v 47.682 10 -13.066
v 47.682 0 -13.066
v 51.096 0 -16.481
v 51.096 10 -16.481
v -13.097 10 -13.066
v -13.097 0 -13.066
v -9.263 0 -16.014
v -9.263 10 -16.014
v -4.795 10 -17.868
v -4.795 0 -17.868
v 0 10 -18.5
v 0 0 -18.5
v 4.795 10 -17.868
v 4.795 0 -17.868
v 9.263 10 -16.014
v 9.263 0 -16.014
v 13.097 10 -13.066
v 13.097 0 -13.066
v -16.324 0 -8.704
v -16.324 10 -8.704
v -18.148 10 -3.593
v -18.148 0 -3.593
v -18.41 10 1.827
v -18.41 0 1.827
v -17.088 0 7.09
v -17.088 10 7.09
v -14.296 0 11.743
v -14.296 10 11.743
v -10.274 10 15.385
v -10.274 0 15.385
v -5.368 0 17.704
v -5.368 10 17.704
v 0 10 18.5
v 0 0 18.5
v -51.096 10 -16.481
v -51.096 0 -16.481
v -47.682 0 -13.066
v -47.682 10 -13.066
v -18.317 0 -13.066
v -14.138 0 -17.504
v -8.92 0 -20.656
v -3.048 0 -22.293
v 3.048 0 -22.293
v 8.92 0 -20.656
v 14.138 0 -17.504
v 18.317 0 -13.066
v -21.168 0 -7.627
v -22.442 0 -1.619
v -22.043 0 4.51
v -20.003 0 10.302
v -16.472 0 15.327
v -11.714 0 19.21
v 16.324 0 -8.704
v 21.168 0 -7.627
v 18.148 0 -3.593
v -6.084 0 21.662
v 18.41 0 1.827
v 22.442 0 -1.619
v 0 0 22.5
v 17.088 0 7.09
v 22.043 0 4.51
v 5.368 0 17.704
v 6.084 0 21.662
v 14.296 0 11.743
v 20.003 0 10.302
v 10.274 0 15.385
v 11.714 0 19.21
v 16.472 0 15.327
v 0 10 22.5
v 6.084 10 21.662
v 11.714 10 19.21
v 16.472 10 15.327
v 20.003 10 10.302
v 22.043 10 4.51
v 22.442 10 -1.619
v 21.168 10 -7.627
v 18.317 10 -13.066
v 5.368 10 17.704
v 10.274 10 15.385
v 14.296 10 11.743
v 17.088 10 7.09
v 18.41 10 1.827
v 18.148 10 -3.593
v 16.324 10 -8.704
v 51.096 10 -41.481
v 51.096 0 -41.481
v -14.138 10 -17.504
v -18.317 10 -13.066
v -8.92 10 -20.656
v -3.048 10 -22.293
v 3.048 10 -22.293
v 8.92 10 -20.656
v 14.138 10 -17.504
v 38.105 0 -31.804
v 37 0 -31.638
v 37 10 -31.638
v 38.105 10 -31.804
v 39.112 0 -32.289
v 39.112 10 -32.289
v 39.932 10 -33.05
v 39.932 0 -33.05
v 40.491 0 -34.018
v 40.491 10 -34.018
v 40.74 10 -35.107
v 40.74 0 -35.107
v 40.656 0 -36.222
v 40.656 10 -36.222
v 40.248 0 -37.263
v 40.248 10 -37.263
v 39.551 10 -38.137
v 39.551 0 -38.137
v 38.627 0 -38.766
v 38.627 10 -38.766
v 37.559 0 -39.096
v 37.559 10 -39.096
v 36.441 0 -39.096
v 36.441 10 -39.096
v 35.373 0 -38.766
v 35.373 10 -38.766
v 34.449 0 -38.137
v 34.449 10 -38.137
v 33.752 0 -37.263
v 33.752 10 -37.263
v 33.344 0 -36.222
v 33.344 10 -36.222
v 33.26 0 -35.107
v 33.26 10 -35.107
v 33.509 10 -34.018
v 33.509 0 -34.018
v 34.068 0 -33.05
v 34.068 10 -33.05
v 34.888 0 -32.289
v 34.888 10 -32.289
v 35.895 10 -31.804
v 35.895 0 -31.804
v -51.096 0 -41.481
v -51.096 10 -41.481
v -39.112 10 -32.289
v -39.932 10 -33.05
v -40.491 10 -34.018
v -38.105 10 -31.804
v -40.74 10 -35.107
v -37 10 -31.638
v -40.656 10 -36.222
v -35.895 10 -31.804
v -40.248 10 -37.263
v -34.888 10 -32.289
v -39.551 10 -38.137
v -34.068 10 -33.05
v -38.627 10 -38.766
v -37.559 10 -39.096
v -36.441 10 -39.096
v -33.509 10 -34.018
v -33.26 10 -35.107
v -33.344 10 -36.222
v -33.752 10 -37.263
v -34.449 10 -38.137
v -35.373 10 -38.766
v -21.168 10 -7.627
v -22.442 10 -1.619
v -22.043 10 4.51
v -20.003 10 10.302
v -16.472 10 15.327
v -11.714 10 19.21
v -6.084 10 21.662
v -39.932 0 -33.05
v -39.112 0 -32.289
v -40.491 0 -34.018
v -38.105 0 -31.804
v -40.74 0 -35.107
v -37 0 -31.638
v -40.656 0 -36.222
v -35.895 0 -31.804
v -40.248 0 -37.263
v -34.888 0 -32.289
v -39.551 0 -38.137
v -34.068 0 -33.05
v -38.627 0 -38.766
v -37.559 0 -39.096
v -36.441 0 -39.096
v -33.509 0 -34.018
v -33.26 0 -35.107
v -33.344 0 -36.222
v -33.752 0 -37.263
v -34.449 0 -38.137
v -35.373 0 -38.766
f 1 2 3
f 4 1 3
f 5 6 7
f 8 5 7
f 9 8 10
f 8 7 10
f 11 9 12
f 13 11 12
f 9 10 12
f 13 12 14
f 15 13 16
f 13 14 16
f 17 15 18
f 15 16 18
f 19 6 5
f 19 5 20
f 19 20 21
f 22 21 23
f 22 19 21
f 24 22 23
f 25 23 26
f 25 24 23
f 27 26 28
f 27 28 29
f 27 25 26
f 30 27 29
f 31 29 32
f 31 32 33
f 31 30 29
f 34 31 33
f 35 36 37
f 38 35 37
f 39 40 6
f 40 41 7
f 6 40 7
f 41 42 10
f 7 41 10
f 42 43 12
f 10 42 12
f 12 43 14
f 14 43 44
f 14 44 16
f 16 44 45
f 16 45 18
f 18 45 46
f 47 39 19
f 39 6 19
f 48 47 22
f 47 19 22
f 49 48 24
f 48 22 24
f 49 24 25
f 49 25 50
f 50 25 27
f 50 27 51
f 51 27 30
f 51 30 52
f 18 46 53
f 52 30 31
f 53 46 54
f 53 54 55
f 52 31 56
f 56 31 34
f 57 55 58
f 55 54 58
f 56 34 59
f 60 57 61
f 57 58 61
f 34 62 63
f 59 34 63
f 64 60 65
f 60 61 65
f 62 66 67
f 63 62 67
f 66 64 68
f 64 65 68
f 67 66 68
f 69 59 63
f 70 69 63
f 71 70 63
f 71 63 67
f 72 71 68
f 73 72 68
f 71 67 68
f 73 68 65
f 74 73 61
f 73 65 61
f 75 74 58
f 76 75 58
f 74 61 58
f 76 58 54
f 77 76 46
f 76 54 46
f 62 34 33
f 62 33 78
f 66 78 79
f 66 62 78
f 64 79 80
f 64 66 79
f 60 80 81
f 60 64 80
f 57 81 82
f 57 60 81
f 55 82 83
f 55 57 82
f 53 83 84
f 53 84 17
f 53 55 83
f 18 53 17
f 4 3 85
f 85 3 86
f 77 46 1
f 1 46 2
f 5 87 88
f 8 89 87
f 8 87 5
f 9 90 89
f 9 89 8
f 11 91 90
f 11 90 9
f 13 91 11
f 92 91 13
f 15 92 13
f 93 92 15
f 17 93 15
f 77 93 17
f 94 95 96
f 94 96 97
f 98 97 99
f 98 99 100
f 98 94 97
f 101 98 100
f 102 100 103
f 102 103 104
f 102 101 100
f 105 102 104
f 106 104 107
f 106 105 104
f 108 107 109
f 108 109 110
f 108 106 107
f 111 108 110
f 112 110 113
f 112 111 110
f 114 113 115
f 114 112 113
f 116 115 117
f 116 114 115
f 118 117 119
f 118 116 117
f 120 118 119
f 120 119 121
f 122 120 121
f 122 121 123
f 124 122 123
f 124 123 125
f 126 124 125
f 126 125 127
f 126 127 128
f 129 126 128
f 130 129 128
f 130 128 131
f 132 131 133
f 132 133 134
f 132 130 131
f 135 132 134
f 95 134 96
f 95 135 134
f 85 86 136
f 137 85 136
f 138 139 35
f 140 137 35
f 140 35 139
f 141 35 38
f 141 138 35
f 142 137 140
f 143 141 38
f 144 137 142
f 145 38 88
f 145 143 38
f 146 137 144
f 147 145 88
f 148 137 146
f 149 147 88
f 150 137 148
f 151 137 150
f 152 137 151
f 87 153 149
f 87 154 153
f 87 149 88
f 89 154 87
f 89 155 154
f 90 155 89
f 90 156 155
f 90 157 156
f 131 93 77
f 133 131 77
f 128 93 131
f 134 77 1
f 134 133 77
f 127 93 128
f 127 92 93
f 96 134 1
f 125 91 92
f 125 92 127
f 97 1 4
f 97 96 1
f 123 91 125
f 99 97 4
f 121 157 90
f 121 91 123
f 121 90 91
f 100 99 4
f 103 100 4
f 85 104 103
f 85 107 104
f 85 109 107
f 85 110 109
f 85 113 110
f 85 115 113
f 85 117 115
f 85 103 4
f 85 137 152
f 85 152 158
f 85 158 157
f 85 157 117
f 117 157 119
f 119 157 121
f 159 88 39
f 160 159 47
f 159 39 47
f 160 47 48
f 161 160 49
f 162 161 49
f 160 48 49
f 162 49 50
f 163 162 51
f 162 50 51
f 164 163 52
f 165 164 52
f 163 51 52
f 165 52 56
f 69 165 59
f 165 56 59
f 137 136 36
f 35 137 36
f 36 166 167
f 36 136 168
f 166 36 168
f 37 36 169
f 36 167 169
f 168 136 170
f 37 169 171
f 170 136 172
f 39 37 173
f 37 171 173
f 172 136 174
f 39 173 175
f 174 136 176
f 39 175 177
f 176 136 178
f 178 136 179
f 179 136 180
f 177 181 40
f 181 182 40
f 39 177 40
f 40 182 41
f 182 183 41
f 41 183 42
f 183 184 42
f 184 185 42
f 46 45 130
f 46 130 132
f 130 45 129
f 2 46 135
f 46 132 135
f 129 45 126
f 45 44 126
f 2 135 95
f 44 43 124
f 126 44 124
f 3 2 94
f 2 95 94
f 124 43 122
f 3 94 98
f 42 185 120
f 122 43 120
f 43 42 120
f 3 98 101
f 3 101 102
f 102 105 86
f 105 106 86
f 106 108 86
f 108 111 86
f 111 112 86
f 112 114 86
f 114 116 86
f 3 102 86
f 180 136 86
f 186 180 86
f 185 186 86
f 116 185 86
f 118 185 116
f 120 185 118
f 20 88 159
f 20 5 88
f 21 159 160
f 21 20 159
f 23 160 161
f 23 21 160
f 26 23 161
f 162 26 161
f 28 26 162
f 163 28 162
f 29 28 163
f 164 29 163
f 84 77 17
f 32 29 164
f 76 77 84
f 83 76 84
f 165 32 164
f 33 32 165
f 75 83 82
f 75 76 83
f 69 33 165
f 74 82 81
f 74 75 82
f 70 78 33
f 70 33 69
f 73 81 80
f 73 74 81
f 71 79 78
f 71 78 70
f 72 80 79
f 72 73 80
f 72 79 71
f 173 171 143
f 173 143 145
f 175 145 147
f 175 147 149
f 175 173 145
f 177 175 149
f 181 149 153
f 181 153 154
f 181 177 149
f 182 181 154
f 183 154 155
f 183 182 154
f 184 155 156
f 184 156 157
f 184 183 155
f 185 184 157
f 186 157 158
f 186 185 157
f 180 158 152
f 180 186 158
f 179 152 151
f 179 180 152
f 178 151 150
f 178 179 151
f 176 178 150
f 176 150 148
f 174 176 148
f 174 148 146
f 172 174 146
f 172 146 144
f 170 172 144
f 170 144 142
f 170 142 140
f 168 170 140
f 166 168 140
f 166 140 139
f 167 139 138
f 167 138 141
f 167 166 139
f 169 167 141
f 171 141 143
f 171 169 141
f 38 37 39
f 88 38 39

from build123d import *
from build123d.topology import SkipClean

# Parameters (mm, degrees)
SKETCH1_R           = 22.5
SKETCH1_R_2         = 18.5
BOSS_EXTRUDE1_DEPTH = 10
SKETCH2_R           = 3.75
BOSS_EXTRUDE2_DEPTH = 10


with BuildPart() as part:
    # Sketch1 → Boss-Extrude1 (new body)
    with BuildSketch(Plane(origin=(0, 0, 0), x_dir=(1, 0, 0), z_dir=(0, 1, 0))):
        with Locations(Location((0, 0, 0), (0, 0, 270))):
            Circle(SKETCH1_R)
        with Locations(Location((0, 0, 0), (0, 0, 270))):
            Circle(SKETCH1_R_2, mode=Mode.SUBTRACT)
    extrude(amount=BOSS_EXTRUDE1_DEPTH)

    # Sketch2 → Boss-Extrude2 (add)
    with SkipClean():  # the faces are left unmerged after this step: merging them gives an invalid solid
        with BuildSketch(Plane(origin=(0, 0, 0), x_dir=(1, 0, 0), z_dir=(0, 1, 0))):
            with BuildLine():
                Line((18.317381325, 13.066121896), (37, 13.066121896))
                Line((37, 13.066121896), (47.681821621, 13.066121896))
                Line((47.681821621, 13.066121896), (51.096419029, 16.480719304))
                Line((51.096419029, 16.480719304), (51.096419029, 41.480719304))
                Line((51.096419029, 41.480719304), (0, 41.480719304))
                Line((0, 41.480719304), (-51.096419029, 41.480719304))
                Line((-51.096419029, 41.480719304), (-51.096419029, 16.480719304))
                Line((-51.096419029, 16.480719304), (-47.681821621, 13.066121896))
                Line((-47.681821621, 13.066121896), (-37, 13.066121896))
                Line((-37, 13.066121896), (-18.317381325, 13.066121896))
                Line((-18.317381325, 13.066121896), (-13.096811009, 13.066121896))
                ThreePointArc((-13.096811009, 13.066121896), (0, 18.5), (13.096811009, 13.066121896))
                Line((13.096811009, 13.066121896), (18.317381325, 13.066121896))
            make_face()
            with Locations(Location((-37, 35.387659732, 0), (0, 0, 270))):
                Circle(SKETCH2_R, mode=Mode.SUBTRACT)
            with Locations(Location((37, 35.387659732, 0), (0, 0, 270))):
                Circle(SKETCH2_R, mode=Mode.SUBTRACT)
        extrude(amount=BOSS_EXTRUDE2_DEPTH)


solid = part.part
